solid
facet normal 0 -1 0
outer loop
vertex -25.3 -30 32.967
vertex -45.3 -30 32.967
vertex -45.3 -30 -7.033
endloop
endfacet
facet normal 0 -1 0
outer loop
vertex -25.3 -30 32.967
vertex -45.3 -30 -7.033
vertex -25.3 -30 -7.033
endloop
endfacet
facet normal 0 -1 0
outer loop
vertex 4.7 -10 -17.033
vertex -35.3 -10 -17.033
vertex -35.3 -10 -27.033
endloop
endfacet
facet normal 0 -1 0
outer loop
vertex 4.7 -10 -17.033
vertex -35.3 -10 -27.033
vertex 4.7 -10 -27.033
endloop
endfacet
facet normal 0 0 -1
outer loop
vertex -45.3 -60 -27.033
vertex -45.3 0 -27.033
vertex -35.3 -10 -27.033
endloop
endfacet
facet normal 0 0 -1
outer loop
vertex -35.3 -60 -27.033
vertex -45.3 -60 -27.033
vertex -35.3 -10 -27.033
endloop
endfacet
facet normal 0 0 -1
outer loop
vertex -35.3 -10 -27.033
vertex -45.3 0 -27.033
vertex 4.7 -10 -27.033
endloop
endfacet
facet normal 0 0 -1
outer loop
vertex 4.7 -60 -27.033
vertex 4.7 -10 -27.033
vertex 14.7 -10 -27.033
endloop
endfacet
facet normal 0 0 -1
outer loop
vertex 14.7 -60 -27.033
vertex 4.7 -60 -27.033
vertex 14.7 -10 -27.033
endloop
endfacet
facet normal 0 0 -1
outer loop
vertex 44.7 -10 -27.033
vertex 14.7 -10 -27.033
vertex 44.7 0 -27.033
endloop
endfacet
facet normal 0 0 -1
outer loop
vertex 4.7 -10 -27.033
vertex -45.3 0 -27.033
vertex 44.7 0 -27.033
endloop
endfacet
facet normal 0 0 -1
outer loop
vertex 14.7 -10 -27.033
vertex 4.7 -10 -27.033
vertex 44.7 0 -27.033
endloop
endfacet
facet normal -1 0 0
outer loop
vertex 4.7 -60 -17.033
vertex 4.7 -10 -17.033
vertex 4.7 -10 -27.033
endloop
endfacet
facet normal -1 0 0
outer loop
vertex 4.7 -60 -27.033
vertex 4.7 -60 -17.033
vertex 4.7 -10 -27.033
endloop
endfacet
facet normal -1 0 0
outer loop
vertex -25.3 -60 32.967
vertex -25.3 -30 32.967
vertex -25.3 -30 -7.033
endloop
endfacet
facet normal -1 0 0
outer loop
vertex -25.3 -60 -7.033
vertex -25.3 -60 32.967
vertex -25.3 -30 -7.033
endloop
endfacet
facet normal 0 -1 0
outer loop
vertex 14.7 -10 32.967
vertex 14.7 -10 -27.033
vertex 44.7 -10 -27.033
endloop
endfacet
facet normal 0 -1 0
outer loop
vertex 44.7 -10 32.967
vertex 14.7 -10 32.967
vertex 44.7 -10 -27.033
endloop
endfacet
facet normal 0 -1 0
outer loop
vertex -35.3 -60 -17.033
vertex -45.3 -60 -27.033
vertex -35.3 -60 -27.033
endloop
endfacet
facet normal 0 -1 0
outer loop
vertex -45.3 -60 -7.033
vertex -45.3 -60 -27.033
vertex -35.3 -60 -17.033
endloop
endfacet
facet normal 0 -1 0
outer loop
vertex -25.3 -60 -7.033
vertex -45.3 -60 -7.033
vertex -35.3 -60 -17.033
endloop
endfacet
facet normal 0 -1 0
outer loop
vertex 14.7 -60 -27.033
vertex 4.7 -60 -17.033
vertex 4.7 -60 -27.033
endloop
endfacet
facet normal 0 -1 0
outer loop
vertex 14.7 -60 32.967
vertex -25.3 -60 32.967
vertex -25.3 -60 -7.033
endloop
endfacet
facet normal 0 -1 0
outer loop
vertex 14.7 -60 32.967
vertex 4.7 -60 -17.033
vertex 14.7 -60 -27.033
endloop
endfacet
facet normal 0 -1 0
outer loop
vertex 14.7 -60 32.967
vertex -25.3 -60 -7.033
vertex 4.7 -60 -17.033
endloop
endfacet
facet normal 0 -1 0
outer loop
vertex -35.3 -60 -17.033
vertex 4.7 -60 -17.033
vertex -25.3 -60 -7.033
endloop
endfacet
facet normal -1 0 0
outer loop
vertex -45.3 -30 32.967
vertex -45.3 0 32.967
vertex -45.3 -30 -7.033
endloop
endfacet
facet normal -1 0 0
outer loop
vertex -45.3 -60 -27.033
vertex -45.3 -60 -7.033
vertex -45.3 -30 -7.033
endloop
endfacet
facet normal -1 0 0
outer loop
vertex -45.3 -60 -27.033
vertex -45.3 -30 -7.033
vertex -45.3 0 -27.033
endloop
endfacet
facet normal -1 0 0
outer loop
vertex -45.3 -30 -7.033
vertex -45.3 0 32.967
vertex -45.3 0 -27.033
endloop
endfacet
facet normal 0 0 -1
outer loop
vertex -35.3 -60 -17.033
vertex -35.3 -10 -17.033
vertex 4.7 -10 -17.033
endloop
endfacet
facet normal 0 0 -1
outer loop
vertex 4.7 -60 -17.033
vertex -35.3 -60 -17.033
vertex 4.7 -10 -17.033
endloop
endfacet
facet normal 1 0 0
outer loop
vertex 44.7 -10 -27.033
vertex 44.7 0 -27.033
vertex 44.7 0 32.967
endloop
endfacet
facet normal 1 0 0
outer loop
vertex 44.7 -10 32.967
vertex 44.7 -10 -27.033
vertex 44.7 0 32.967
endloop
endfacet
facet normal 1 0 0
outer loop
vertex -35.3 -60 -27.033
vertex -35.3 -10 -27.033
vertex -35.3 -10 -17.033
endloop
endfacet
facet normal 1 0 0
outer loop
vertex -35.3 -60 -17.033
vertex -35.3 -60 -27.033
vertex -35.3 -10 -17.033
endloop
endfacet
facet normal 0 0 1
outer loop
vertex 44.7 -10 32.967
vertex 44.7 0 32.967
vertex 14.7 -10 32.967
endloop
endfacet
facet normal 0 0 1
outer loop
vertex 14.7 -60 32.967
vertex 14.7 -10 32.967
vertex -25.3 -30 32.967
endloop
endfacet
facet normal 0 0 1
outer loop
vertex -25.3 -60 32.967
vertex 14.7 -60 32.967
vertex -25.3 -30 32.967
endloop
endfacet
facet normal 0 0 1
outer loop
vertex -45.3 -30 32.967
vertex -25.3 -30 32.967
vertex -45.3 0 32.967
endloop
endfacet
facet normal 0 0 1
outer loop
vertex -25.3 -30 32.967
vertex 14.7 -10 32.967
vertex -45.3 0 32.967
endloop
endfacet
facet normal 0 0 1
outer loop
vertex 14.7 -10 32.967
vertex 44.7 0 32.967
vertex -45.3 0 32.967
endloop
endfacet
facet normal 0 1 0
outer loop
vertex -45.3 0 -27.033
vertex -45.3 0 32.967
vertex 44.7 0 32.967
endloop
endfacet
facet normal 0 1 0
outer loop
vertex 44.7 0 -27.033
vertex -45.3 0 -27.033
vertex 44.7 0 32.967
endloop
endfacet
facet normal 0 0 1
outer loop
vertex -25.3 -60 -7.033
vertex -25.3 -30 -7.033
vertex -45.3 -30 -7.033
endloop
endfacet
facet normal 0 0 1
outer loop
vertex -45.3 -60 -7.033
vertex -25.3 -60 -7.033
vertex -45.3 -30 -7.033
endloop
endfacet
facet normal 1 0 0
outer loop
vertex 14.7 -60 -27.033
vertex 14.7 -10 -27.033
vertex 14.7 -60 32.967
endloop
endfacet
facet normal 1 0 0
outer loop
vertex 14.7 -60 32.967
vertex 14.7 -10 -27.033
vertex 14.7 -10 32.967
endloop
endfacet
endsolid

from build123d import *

# Parameters (mm, degrees)
F1_DEPTH = 60
F0_W     = 20
F0_H     = 40
F0_W_2   = 30
F0_H_2   = 60
F0_W_3   = 40
F0_H_3   = 10
F2_DEPTH = 10
F3_DEPTH = 30


with BuildPart() as f1:
    # F0 (on Front) → F1 (new body)
    with BuildSketch(Plane.XZ):
        Polygon((14.700101, 32.967453), (-25.299899, 32.967453), (-25.299899, -7.032547), (-45.299899, -7.032547), (-45.299899, -27.032547), (-35.299899, -27.032547), (-35.299899, -17.032547), (4.700101, -17.032547), (4.700101, -27.032547), (14.700101, -27.032547), align=None)
    extrude(amount=F1_DEPTH)

    # F0 (on Front) → F2 (join)
    with BuildSketch(Plane.XZ):
        with Locations((-35.299899, 12.967453)):
            Rectangle(F0_W, F0_H)
        Polygon((14.700101, 32.967453), (-25.299899, 32.967453), (-25.299899, -7.032547), (-45.299899, -7.032547), (-45.299899, -27.032547), (-35.299899, -27.032547), (-35.299899, -17.032547), (4.700101, -17.032547), (4.700101, -27.032547), (14.700101, -27.032547), align=None)
        with Locations((29.700101, 2.967453)):
            Rectangle(F0_W_2, F0_H_2)
        with Locations((-15.299899, -22.032547)):
            Rectangle(F0_W_3, F0_H_3)
    extrude(amount=F2_DEPTH)

    # F0 (on Front) → F3 (join)
    with BuildSketch(Plane.XZ):
        with Locations((-35.299899, 12.967453)):
            Rectangle(F0_W, F0_H)
    extrude(amount=F3_DEPTH)


solid = f1.part
